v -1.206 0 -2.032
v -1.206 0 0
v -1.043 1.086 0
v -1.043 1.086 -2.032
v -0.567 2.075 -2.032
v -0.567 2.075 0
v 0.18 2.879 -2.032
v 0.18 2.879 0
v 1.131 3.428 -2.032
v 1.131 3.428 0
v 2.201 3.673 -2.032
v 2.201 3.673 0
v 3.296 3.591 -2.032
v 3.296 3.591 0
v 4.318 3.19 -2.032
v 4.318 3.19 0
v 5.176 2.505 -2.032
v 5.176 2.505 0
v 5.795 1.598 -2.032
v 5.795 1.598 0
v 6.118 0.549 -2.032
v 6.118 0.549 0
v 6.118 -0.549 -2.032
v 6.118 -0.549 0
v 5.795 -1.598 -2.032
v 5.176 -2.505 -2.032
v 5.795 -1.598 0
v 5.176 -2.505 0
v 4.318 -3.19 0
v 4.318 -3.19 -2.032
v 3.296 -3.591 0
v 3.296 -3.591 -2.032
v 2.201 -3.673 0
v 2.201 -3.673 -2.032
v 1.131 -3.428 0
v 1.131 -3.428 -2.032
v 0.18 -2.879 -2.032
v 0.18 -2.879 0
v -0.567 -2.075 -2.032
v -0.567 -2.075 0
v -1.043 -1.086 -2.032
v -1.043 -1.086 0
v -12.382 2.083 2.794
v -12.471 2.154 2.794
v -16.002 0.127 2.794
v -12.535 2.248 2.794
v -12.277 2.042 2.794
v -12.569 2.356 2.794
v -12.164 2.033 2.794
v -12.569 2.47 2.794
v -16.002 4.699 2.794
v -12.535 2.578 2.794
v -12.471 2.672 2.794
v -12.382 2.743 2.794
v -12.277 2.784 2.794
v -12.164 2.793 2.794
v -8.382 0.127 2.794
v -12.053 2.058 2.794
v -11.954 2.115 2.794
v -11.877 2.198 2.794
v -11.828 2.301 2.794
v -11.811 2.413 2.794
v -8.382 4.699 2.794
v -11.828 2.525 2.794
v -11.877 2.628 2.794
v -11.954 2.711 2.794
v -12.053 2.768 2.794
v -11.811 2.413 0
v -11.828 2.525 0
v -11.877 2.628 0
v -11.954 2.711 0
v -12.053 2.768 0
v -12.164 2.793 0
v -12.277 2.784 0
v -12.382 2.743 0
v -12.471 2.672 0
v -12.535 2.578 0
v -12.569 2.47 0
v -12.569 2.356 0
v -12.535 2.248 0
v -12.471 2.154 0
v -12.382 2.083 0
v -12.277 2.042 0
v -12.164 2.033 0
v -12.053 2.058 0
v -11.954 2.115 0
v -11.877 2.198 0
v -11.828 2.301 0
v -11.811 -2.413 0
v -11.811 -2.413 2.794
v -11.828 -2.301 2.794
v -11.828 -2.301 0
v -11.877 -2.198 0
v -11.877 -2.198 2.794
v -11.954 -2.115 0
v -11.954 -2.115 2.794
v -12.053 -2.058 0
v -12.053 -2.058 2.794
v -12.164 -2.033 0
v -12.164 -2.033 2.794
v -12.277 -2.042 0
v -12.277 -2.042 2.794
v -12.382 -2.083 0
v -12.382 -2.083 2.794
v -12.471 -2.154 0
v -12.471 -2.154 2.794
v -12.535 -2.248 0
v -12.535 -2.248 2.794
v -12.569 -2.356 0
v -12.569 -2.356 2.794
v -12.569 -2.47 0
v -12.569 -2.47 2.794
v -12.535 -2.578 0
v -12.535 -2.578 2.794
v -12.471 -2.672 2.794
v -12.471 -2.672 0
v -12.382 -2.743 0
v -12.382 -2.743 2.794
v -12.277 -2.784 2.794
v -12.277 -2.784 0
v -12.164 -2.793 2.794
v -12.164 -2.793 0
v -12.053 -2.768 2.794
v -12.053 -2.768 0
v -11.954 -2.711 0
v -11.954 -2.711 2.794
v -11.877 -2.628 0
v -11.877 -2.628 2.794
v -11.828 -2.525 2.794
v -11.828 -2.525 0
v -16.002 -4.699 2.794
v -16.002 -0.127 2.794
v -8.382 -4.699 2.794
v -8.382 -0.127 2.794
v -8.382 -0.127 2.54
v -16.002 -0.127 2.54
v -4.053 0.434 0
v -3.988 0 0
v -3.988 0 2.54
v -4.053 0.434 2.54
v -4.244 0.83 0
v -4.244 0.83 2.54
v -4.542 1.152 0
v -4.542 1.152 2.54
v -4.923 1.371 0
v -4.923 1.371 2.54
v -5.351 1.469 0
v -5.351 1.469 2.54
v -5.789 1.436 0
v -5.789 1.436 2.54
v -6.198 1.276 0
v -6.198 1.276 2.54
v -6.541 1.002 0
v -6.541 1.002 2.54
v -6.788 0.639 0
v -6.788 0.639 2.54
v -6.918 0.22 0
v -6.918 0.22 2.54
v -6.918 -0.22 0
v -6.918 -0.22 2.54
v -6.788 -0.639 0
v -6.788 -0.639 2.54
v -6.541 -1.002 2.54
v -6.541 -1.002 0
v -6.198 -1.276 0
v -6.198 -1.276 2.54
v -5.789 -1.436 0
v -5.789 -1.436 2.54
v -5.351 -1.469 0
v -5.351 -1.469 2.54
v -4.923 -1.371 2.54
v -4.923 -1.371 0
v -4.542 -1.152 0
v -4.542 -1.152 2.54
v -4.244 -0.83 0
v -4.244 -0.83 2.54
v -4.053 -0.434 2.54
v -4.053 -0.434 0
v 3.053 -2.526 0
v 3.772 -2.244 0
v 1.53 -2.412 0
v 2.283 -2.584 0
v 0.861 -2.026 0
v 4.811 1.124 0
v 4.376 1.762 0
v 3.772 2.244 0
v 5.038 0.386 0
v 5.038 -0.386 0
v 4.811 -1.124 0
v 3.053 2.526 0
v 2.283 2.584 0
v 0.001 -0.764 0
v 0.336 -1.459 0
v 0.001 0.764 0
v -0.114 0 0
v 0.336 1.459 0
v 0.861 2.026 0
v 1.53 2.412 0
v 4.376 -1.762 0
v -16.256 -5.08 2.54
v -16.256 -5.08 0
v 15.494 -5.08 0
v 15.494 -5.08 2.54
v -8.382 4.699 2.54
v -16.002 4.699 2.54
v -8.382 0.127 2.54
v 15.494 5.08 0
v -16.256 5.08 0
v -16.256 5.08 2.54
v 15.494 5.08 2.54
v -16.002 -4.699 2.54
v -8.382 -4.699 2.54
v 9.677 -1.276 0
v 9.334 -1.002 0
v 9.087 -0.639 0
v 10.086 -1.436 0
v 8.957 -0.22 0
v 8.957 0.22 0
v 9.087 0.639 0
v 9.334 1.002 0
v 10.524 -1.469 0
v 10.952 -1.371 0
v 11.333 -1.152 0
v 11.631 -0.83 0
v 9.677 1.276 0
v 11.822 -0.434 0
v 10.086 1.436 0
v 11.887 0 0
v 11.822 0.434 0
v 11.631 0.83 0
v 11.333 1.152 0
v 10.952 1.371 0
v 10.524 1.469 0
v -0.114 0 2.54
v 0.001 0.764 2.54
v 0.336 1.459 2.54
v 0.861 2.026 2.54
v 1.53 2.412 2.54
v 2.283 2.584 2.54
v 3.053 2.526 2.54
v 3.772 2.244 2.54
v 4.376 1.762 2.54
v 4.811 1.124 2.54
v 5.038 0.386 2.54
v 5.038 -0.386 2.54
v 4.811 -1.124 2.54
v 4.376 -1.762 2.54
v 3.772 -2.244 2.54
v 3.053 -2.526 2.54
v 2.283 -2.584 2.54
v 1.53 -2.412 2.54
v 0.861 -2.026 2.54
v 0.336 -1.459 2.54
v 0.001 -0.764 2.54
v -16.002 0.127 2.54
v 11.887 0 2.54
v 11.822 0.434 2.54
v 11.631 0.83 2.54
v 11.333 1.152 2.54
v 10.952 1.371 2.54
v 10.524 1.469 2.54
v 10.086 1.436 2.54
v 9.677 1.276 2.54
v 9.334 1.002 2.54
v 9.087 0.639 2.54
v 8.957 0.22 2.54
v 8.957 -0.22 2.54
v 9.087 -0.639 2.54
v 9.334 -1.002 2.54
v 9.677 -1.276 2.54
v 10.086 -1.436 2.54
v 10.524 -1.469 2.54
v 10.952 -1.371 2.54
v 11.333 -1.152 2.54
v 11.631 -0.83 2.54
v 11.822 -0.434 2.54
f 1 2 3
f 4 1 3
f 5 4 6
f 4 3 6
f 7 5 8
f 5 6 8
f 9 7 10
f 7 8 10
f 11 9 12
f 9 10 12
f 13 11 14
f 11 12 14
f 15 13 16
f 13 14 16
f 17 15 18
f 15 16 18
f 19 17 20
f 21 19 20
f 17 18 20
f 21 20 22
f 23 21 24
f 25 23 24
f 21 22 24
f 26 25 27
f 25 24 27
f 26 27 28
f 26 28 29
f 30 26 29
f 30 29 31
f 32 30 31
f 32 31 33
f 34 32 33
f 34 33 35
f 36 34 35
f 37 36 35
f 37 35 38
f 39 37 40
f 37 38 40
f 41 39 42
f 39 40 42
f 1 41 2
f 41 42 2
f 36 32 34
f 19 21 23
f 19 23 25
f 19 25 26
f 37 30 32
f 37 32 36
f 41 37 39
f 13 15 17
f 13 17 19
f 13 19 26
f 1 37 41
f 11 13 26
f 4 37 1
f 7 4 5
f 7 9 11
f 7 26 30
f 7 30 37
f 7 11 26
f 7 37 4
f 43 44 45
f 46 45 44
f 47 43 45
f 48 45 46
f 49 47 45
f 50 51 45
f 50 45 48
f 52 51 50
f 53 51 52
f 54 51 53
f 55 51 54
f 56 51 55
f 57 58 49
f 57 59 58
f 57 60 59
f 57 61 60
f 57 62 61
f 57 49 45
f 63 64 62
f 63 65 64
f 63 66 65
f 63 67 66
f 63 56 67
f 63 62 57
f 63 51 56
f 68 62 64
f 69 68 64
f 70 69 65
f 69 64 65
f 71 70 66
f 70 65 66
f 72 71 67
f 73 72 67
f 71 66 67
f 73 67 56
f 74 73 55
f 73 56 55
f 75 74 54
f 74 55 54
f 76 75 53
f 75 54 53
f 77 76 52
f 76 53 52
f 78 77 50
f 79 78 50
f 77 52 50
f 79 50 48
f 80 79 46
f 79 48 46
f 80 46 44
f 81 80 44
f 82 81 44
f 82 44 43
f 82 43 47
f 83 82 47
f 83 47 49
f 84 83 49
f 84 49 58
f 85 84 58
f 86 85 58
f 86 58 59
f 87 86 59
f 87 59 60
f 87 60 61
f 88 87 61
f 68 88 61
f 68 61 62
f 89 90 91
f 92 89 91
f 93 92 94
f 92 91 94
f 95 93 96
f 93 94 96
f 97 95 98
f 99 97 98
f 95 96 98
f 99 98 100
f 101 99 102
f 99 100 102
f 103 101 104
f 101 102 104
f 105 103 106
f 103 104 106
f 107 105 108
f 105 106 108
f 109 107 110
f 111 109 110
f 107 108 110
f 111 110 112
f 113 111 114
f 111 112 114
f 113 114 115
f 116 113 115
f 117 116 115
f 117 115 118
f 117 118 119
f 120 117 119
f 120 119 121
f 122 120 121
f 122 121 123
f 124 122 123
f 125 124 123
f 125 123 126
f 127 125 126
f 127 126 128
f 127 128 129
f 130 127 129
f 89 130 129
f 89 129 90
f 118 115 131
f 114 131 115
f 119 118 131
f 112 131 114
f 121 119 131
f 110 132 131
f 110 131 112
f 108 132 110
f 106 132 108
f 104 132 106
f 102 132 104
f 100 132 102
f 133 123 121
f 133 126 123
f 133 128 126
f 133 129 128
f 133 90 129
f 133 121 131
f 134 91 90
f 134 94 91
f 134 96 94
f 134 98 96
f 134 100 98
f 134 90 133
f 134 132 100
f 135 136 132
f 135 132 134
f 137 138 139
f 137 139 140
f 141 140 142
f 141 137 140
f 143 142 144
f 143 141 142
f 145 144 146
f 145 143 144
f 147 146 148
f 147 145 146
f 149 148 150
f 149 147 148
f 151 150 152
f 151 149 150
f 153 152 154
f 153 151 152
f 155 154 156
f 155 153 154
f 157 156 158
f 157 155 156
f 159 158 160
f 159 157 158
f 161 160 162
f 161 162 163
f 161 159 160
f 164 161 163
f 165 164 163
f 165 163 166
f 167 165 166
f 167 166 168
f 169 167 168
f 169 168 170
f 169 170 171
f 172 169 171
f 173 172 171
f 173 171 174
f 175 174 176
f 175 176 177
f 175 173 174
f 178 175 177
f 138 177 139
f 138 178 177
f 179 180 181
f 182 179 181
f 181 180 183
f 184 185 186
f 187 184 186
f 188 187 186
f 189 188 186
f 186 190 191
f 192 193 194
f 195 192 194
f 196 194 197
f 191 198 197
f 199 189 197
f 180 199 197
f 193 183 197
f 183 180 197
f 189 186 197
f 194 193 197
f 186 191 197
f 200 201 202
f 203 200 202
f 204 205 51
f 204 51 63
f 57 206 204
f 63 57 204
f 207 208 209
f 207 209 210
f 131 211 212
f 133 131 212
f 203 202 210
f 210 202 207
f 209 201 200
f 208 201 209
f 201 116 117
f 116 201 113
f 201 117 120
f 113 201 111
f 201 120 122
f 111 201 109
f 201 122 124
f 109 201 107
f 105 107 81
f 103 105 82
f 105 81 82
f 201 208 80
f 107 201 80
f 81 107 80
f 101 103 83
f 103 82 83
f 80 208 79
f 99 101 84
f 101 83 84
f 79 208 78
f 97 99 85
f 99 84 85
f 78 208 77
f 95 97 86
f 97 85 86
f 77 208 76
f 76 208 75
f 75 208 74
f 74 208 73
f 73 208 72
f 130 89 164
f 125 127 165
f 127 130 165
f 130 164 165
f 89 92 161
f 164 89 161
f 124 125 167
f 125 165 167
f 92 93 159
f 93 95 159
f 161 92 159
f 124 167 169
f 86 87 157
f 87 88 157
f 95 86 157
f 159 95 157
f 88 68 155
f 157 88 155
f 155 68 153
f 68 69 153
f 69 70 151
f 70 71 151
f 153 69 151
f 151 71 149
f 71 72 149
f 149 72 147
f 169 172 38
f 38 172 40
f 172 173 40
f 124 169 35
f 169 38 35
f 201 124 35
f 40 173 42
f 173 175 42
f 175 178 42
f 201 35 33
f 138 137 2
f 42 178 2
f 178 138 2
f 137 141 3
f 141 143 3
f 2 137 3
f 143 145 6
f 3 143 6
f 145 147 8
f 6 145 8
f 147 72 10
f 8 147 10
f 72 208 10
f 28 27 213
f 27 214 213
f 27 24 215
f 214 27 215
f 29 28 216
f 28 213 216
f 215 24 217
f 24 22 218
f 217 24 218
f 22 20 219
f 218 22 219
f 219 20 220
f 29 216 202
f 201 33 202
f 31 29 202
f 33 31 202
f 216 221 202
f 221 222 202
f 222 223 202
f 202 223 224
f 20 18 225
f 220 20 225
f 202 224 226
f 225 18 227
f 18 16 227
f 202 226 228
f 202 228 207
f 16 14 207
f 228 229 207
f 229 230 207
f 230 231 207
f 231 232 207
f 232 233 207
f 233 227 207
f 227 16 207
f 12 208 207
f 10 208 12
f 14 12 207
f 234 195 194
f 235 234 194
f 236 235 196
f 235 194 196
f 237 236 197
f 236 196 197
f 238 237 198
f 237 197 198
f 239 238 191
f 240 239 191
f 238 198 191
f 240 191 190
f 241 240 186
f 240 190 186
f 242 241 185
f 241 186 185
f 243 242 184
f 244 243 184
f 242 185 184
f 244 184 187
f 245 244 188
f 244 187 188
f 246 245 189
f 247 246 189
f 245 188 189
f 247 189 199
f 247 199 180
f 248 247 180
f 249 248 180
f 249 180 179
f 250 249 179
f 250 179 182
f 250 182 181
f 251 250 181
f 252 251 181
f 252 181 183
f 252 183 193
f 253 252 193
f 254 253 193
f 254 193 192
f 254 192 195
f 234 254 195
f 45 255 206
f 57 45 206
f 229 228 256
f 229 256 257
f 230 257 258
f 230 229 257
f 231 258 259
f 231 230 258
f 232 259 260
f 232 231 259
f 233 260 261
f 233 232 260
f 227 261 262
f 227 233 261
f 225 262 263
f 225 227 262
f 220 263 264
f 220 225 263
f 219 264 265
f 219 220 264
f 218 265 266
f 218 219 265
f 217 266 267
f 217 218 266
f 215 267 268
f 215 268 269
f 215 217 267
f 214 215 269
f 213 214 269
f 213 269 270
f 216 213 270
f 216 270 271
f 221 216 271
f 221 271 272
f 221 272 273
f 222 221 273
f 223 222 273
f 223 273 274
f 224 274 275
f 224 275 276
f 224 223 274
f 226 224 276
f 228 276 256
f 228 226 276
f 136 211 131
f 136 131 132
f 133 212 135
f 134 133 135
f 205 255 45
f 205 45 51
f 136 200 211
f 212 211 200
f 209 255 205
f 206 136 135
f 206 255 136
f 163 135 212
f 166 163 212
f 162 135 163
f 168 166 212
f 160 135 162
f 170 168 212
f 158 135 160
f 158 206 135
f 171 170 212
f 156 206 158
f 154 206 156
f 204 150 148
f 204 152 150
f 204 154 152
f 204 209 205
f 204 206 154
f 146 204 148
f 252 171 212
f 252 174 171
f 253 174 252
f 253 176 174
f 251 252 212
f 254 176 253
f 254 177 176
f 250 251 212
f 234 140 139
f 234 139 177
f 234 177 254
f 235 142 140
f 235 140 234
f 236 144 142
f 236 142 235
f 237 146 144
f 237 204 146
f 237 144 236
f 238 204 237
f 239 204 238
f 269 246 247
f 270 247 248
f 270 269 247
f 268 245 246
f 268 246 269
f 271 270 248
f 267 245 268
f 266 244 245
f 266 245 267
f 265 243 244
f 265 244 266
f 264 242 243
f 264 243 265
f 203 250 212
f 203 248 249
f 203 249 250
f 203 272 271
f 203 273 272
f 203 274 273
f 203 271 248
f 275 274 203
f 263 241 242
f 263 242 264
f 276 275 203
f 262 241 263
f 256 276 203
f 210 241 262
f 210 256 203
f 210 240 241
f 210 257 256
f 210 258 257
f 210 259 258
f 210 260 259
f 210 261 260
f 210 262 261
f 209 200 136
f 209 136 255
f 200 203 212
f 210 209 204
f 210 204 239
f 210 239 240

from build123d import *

# Parameters (mm, degrees)
SKETCH2_W                  = 31.75
SKETCH2_H                  = 10.16
SKETCH2_R                  = 1.4732
BOSS_EXTRUDE1_DEPTH        = 2.54
F_6_0_204_DIAMETER_HOLE1_D = 5.1816
SKETCH5_W                  = 7.62
SKETCH5_H                  = 4.572
BOSS_EXTRUDE2_DEPTH        = 0.254
SKETCH6_R                  = 0.381
CUT_EXTRUDE1_DEPTH         = 3.794
SKETCH7_R                  = 3.683
BOSS_EXTRUDE3_DEPTH        = 2.032


with BuildPart() as part:
    # Sketch2 → Boss-Extrude1 (new body)
    with BuildSketch(Plane.XY):
        with Locations((-0.381, 0)):
            Rectangle(SKETCH2_W, SKETCH2_H)
        with Locations((-5.461, 0)):
            Circle(SKETCH2_R, mode=Mode.SUBTRACT)
        with Locations((10.414, 0)):
            Circle(SKETCH2_R, mode=Mode.SUBTRACT)
    extrude(amount=BOSS_EXTRUDE1_DEPTH)

    # #6 (0.204) Diameter Hole1 (through all)
    with Locations(Plane(origin=(2.4765, 0, 2.54), x_dir=(1, 0, 0), z_dir=(0, 0, 1))):
        with Locations((0, 0)):
            Hole(F_6_0_204_DIAMETER_HOLE1_D / 2)

    # Sketch5 → Boss-Extrude2 (add)
    with BuildSketch(Plane.XY.offset(2.54)):
        with Locations((-12.192, 2.413)):
            Rectangle(SKETCH5_W, SKETCH5_H)
        with Locations((-12.192, -2.413)):
            Rectangle(SKETCH5_W, SKETCH5_H)
    extrude(amount=BOSS_EXTRUDE2_DEPTH)

    # Sketch6 → Cut-Extrude1 (cut, through all)
    with BuildSketch(Plane.XY.offset(2.794)):
        with Locations((-12.192, 2.413)):
            Circle(SKETCH6_R)
        with Locations((-12.192, -2.413)):
            Circle(SKETCH6_R)
    extrude(amount=-CUT_EXTRUDE1_DEPTH, mode=Mode.SUBTRACT)

    # Sketch7 → Boss-Extrude3 (add)
    with BuildSketch(Plane(origin=(0, 0, 0), x_dir=(-1, 0, 0), z_dir=(0, 0, -1))):
        with Locations((-2.4765, 0)):
            Circle(SKETCH7_R)
    extrude(amount=BOSS_EXTRUDE3_DEPTH)


solid = part.part
